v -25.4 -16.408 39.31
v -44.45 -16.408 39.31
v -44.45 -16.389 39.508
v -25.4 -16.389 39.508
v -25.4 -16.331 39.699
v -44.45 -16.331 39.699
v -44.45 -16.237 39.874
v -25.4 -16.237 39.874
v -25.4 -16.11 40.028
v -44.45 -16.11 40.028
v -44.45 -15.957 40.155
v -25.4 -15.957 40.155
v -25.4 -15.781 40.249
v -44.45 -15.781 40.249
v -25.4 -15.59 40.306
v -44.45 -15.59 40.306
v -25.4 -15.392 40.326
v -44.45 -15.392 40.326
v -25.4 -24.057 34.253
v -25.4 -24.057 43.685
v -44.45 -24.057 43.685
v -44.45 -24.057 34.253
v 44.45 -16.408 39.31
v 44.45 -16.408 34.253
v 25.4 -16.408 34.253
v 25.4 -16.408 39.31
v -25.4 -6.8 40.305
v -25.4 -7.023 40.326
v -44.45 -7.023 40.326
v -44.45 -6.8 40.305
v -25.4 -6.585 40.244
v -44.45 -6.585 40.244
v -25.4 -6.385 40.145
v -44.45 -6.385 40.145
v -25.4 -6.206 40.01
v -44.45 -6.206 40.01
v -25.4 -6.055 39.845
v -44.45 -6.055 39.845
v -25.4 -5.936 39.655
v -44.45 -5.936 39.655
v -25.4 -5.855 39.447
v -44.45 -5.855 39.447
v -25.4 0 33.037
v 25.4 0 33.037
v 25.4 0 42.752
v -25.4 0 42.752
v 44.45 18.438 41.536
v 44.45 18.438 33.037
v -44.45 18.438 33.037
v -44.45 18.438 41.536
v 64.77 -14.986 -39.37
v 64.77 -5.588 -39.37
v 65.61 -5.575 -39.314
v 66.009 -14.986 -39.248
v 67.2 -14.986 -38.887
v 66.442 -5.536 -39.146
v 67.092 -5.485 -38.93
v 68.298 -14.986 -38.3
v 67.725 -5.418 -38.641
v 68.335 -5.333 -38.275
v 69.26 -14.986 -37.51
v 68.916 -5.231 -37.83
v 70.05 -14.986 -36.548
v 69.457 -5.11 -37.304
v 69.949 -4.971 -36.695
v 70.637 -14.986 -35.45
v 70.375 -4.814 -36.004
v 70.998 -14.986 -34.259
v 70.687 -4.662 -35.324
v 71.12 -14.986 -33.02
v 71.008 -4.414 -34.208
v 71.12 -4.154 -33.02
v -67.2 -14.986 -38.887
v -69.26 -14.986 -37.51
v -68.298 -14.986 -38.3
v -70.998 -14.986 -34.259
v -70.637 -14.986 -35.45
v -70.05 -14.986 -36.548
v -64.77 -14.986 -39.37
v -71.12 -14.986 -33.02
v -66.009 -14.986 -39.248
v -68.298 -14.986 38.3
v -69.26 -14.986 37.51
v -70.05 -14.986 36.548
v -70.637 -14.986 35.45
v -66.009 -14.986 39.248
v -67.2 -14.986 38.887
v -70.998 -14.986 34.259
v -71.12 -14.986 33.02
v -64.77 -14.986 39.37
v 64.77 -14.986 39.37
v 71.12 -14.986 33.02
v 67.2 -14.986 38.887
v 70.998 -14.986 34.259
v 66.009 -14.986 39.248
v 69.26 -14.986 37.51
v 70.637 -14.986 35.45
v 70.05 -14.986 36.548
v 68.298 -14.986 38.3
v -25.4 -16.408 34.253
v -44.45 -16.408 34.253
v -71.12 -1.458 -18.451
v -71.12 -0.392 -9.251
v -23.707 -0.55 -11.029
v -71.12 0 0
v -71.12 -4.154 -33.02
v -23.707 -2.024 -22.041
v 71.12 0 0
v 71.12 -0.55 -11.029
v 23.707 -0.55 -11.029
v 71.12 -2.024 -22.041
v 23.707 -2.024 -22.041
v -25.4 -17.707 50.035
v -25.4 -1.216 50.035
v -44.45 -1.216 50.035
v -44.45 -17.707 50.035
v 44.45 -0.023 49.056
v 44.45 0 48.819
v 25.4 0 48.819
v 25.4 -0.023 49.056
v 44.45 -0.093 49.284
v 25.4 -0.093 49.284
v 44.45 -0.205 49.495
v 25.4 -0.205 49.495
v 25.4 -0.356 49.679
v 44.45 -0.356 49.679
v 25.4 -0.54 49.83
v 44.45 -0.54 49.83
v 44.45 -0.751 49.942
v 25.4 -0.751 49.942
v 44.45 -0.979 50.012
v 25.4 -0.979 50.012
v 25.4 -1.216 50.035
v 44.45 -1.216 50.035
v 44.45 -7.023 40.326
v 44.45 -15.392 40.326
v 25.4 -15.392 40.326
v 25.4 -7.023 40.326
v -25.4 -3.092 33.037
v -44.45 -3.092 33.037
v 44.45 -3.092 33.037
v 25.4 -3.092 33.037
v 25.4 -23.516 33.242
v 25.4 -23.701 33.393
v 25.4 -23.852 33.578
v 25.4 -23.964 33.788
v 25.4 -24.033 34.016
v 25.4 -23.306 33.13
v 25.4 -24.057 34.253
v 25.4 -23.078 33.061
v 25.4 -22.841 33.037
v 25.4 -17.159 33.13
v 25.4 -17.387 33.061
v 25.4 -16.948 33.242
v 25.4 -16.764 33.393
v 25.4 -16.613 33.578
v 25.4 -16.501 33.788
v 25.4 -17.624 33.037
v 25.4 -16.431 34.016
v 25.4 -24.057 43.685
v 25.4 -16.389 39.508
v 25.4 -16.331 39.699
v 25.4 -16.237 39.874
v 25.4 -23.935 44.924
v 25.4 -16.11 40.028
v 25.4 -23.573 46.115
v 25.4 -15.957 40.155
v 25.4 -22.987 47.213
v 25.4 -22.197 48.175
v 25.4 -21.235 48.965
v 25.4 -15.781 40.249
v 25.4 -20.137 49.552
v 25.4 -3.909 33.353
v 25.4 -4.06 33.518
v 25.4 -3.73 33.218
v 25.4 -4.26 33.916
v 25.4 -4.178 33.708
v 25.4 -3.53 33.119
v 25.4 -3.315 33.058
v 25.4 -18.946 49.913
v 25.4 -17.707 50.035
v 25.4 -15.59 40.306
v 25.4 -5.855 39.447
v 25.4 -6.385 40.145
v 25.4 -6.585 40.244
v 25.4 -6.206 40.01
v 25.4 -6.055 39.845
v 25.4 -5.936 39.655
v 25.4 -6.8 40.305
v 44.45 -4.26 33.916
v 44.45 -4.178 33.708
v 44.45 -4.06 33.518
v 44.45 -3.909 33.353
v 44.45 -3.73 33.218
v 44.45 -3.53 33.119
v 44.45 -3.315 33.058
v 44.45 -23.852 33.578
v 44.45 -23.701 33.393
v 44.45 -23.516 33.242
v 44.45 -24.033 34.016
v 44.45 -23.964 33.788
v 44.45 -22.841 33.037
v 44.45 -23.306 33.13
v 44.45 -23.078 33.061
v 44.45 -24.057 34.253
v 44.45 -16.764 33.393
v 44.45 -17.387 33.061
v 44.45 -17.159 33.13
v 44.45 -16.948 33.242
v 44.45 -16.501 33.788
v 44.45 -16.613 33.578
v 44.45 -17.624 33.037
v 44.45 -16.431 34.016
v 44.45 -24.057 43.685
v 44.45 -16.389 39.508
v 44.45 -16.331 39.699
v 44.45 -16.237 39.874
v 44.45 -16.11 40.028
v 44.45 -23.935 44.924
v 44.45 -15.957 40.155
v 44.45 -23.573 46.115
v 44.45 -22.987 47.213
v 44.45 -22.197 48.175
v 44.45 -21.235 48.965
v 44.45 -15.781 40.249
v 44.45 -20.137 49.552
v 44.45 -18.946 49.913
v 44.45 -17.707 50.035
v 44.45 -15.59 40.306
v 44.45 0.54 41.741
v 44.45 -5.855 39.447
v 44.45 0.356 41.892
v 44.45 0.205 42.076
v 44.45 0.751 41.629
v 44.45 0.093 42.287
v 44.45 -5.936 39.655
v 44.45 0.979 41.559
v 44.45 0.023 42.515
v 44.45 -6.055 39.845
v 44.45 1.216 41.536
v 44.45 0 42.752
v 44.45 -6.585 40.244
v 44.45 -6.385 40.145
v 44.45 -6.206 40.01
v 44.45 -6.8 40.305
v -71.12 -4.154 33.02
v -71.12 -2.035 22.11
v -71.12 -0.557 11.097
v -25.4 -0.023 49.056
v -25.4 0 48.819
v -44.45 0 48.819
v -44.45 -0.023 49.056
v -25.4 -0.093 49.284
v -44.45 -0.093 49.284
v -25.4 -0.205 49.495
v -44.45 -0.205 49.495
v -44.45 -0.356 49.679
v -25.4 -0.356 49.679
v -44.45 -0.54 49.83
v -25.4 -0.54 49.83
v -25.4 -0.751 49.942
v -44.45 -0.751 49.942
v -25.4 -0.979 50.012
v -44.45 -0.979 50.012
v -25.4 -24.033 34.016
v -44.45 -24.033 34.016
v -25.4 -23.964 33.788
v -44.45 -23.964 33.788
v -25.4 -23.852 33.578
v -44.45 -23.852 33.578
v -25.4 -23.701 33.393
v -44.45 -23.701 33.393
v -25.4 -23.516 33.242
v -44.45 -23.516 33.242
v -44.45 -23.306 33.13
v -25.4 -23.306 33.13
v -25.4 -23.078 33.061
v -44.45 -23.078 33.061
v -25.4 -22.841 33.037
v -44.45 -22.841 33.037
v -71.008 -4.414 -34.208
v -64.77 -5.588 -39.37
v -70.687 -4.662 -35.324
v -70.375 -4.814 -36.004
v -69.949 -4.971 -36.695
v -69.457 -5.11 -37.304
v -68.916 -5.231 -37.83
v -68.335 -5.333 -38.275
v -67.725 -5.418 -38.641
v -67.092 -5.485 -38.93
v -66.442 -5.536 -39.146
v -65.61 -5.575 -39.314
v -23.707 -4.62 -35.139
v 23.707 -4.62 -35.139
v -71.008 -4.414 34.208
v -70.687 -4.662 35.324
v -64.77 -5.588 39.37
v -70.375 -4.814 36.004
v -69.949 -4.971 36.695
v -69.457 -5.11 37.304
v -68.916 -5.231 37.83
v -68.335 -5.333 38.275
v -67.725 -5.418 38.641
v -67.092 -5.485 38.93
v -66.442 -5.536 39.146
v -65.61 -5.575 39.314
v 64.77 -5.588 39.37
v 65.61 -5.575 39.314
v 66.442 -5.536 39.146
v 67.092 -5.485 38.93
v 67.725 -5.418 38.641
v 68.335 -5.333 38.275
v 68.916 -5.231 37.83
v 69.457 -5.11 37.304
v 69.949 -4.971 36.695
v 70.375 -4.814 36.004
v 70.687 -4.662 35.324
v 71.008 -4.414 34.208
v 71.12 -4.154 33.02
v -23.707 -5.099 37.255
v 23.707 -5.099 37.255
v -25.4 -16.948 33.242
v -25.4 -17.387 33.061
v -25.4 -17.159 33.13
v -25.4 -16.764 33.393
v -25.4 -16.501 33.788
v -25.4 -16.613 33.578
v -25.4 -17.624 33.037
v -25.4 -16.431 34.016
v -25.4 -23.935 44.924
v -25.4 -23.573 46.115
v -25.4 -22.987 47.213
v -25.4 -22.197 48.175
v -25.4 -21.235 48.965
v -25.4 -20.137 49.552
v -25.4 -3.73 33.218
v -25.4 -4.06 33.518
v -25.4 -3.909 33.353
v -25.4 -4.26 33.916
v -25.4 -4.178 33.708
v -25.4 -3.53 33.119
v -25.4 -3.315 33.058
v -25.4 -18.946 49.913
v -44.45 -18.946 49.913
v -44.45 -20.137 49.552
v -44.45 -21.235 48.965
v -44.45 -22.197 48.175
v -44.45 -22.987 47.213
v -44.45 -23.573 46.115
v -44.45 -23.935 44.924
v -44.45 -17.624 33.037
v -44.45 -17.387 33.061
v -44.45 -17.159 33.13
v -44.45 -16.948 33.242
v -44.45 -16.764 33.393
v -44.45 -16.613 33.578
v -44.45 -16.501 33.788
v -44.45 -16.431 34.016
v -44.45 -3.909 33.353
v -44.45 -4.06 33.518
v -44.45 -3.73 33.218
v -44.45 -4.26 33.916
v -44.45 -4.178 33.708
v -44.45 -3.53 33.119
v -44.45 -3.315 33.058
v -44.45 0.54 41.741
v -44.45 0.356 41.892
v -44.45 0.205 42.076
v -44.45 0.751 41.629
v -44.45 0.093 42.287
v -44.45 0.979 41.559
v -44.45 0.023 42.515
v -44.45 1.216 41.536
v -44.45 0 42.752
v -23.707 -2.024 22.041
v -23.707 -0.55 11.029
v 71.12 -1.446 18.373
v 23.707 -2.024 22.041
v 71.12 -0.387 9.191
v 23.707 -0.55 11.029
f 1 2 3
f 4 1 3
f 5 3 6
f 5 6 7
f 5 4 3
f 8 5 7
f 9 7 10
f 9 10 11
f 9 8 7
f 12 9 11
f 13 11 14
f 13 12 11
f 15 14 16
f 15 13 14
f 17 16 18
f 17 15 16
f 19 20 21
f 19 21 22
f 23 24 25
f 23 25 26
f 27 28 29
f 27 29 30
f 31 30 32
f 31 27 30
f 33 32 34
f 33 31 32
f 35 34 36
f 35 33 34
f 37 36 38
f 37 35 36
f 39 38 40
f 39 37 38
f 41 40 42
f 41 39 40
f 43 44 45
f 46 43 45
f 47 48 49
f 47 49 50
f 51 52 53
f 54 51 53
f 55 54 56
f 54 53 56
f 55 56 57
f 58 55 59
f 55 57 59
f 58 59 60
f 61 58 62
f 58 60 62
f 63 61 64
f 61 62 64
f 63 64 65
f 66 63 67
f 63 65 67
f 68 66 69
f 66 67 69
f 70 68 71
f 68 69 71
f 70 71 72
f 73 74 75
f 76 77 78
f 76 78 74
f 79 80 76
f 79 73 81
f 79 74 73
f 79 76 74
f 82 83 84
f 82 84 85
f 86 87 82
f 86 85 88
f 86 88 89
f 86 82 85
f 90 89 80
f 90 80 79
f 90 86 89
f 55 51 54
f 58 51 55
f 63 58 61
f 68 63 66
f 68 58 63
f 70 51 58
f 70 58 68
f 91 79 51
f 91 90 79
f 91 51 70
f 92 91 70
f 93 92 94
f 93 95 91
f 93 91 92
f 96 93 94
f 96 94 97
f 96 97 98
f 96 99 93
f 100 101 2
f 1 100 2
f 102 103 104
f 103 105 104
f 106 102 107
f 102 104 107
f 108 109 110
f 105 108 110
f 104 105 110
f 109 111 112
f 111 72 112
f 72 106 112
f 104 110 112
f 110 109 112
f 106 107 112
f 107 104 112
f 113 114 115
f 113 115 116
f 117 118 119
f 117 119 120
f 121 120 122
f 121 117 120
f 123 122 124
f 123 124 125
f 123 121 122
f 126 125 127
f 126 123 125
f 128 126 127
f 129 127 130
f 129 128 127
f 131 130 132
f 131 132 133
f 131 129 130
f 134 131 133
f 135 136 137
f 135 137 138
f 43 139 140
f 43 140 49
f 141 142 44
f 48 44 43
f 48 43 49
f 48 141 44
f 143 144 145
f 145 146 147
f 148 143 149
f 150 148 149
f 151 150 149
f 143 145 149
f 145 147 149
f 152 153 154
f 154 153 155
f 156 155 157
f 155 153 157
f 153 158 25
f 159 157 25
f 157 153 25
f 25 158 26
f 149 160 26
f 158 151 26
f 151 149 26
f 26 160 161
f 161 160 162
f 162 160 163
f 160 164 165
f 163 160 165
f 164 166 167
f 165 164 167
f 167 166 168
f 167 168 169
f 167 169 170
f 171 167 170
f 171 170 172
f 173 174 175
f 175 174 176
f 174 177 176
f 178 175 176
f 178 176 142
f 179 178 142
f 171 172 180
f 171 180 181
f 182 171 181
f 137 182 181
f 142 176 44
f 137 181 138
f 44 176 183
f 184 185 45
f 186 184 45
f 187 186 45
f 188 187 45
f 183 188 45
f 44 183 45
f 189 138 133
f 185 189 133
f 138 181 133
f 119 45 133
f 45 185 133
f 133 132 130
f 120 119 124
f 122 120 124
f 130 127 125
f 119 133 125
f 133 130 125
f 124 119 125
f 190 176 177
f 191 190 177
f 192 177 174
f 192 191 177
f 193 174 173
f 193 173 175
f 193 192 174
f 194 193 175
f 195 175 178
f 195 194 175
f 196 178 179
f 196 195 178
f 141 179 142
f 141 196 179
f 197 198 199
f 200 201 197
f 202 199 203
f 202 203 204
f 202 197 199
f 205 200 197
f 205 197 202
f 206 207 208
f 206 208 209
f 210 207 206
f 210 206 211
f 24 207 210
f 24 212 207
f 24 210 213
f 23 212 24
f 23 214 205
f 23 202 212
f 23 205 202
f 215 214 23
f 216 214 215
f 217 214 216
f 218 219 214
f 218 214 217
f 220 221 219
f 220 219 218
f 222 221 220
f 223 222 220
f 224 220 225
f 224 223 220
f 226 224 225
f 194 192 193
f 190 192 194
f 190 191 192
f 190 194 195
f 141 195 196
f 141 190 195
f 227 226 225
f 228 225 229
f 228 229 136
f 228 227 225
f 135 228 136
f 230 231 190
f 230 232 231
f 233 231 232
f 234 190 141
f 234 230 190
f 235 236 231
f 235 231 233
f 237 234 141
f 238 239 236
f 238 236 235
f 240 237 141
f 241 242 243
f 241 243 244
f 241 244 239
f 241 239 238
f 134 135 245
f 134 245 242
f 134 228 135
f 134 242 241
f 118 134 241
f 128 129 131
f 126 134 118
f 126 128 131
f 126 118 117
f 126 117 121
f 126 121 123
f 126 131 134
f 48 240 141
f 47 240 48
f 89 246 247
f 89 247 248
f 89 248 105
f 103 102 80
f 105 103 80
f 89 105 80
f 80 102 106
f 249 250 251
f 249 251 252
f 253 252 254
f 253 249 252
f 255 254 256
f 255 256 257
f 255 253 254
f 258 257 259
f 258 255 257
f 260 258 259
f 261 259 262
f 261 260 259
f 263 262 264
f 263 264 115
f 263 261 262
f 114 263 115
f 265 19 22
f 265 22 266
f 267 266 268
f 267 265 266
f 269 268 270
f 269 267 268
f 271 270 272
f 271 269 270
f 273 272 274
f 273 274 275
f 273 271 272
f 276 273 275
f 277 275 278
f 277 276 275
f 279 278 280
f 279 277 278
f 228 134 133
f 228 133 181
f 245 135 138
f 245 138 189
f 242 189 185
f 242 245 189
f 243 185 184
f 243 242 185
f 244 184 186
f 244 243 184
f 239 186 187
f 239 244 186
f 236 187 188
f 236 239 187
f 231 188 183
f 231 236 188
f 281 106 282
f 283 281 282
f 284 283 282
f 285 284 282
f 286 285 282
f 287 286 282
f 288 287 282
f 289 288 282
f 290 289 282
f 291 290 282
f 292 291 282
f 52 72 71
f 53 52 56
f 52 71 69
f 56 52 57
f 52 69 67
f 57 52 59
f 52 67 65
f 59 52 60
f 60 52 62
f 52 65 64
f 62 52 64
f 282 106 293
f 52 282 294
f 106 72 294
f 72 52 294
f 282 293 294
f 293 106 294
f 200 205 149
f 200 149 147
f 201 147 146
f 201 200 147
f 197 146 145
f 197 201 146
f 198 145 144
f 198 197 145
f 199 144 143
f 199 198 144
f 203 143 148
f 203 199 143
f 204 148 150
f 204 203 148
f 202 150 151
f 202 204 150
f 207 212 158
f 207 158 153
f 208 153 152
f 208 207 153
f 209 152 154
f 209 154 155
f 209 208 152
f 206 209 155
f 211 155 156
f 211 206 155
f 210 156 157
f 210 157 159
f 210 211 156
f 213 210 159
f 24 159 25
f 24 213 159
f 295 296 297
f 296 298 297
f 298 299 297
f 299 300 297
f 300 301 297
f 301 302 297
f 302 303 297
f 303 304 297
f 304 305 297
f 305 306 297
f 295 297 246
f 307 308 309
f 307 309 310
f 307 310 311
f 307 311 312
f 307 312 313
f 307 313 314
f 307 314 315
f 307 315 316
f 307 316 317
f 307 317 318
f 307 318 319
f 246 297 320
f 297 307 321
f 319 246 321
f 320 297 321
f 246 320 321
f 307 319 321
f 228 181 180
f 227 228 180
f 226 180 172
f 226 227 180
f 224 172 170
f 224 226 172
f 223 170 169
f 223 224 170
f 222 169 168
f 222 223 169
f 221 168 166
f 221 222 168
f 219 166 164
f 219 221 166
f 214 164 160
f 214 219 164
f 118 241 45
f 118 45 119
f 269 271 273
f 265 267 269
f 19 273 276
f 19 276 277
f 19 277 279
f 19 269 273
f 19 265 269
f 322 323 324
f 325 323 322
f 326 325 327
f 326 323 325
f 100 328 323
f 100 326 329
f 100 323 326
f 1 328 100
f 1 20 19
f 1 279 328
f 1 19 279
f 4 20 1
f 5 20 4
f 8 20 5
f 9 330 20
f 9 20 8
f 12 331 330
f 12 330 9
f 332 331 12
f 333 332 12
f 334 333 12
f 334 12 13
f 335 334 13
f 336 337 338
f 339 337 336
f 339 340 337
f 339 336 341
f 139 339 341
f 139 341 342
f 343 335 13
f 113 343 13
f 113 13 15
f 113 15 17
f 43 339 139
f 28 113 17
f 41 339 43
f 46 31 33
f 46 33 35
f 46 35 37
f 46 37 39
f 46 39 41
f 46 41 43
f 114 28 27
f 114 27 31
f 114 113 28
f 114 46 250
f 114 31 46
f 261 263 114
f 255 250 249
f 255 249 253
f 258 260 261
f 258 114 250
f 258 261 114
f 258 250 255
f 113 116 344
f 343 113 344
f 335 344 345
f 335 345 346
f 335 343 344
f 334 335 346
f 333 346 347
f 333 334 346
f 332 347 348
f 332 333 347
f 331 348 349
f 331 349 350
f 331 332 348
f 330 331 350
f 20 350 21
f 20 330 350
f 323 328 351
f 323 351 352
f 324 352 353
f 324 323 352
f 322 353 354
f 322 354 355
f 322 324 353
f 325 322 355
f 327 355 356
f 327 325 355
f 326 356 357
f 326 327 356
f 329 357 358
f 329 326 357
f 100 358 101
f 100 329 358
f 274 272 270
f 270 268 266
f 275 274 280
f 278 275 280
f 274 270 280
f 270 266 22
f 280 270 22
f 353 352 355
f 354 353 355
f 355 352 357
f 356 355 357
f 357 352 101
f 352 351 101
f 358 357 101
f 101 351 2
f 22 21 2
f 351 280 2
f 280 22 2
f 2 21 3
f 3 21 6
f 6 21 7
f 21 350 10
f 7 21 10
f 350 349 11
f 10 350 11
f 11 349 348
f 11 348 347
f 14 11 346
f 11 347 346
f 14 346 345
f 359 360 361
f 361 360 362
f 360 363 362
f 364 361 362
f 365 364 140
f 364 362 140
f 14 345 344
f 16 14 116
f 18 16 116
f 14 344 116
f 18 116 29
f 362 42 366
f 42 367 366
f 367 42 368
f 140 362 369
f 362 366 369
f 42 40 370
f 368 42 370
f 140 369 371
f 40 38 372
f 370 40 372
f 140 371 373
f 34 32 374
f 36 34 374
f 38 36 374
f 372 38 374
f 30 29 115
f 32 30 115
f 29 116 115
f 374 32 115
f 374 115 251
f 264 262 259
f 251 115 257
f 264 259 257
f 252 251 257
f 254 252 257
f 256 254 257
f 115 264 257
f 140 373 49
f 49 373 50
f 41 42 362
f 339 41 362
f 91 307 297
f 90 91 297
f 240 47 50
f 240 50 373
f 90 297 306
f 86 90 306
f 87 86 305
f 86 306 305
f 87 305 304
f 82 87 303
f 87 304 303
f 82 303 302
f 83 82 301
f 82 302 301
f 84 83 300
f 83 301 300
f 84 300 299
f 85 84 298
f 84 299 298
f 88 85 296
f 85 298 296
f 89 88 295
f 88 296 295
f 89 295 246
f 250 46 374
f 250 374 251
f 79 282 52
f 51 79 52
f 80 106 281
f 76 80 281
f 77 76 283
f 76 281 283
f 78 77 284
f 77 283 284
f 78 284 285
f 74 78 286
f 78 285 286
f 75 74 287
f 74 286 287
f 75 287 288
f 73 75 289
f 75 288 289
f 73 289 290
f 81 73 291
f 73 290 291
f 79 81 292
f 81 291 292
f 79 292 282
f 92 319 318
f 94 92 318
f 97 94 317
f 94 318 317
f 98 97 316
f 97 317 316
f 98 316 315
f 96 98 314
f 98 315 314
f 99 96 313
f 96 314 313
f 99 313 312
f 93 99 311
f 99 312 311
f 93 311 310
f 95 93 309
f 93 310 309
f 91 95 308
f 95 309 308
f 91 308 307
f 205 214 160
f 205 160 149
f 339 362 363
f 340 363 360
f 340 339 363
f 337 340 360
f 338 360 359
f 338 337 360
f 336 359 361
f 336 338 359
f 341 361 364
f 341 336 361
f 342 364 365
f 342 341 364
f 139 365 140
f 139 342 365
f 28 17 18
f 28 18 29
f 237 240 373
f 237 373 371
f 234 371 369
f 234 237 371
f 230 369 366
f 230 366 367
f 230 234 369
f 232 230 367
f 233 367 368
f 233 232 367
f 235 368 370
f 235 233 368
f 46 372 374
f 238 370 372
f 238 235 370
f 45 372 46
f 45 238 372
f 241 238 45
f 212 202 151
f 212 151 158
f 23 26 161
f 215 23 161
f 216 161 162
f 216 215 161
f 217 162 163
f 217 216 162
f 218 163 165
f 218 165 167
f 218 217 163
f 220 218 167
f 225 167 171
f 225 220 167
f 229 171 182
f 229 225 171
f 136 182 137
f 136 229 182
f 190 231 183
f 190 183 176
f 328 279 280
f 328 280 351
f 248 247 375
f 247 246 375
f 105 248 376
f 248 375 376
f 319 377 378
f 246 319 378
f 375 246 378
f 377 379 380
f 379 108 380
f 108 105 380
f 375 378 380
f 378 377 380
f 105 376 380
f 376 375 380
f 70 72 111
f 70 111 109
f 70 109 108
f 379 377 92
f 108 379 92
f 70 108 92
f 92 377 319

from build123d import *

# Parameters (mm, degrees)
F1_DEPTH      = 14.986
F3_DEPTH      = 142.241
F5_DEPTH      = 44.45
F5_DEPTH_BACK = 44.45
F6_DEPTH      = 25.4
F6_DEPTH_BACK = 25.4


# Not quite as in the source:
# - a feature names something its author has since deleted; it is built from what else it names


with BuildPart() as f1:
    # F0 (on Front) → F1 (new body)
    with BuildSketch(Plane.XZ):
        with BuildLine():
            Line((-64.77, -39.37), (64.77, -39.37))
            ThreePointArc((64.77, -39.37), (69.2601280605, -37.5101280605), (71.12, -33.02))
            Line((71.12, -33.02), (71.12, 33.02))
            ThreePointArc((71.12, 33.02), (69.2601280605, 37.5101280605), (64.77, 39.37))
            Line((64.77, 39.37), (-64.77, 39.37))
            ThreePointArc((-64.77, 39.37), (-69.2601280605, 37.5101280605), (-71.12, 33.02))
            Line((-71.12, 33.02), (-71.12, -33.02))
            ThreePointArc((-71.12, -33.02), (-69.2601280605, -37.5101280605), (-64.77, -39.37))
        make_face()
    extrude(amount=F1_DEPTH)

    # F2 (on face) → F3 (cut, through all)
    with BuildSketch(Plane.YZ.offset(71.12)):
        with BuildLine():
            Line((0, 39.37), (-5.588, 39.37))
            add(Edge.make_bspline(
                [(-5.588, 39.37), (-5.0939327167, 37.2564899548), (-4.6132131193, 35.139642988), (-4.1544956107, 33.02)],
                knots=[0, 0, 0, 0, 0.0810477827, 0.0810477827, 0.0810477827, 0.0810477827], degree=3))
            Line((-4.1544956107, 33.02), (0, 33.02))
            Line((0, 33.02), (0, 39.37))
        make_face()
        with BuildLine():
            Line((0, 33.02), (-4.1544956107, 33.02))
            add(Edge.make_bspline(
                [(-4.1544956107, 33.02), (-1.7832929575, 22.0631409692), (0, 11.0315704846), (0, 0)],
                knots=[0.0810477827, 0.0810477827, 0.0810477827, 0.0810477827, 0.5, 0.5, 0.5, 0.5], degree=3))
            Line((0, 0), (0, 33.02))
        make_face()
        with BuildLine():
            Line((0, -33.02), (0, 0))
            add(Edge.make_bspline(
                [(0, 0), (0, -11.0315704846), (-1.7832929575, -22.0631409692), (-4.1544956107, -33.02)],
                knots=[0.5, 0.5, 0.5, 0.5, 0.9189522173, 0.9189522173, 0.9189522173, 0.9189522173], degree=3))
            Line((-4.1544956107, -33.02), (0, -33.02))
        make_face()
        with BuildLine():
            Line((0, -33.02), (-4.1544956107, -33.02))
            add(Edge.make_bspline(
                [(-4.1544956107, -33.02), (-4.6132131193, -35.139642988), (-5.0939327167, -37.2564899548), (-5.588, -39.37)],
                knots=[0.9189522173, 0.9189522173, 0.9189522173, 0.9189522173, 1, 1, 1, 1], degree=3))
            Line((-5.588, -39.37), (0, -39.37))
            Line((0, -39.37), (0, -39.1186140473))
            Line((0, -39.1186140473), (0, -33.02))
        make_face()
    extrude(amount=-F3_DEPTH, mode=Mode.SUBTRACT)


with BuildPart() as f5:
    # F4 (on Right) → F5 (new body, two sides)
    with BuildSketch(Plane.YZ) as f5_sk:
        with BuildLine():
            Line((-1.2158148456, 50.0348769128), (-17.7066842258, 50.0348769128))
            ThreePointArc((-17.7066842258, 50.0348769128), (-22.1968122863, 48.1750049734), (-24.0566842258, 43.6848769128))
            Line((-24.0566842258, 43.6848769128), (-24.0566842258, 34.2530116905))
            ThreePointArc((-24.0566842258, 34.2530116905), (-23.7005803022, 33.3933007684), (-22.8408693802, 33.0371968448))
            Line((-22.8408693802, 33.0371968448), (-17.6238791954, 33.0371968448))
            ThreePointArc((-17.6238791954, 33.0371968448), (-16.7641682733, 33.3933007684), (-16.4080643497, 34.2530116905))
            Line((-16.4080643497, 34.2530116905), (-16.4080643497, 39.3098837759))
            ThreePointArc((-16.4080643497, 39.3098837759), (-16.1104848394, 40.0283042656), (-15.3920643497, 40.3258837759))
            Line((-15.3920643497, 40.3258837759), (-7.023171001, 40.3258837759))
            ThreePointArc((-7.023171001, 40.3258837759), (-6.2922111741, 40.0816158774), (-5.8549638669, 39.4469633211))
            Line((-5.8549638669, 39.4469633211), (-4.2599462141, 33.9161172996))
            ThreePointArc((-4.2599462141, 33.9161172996), (-3.8226989069, 33.2814647434), (-3.09173908, 33.0371968448))
            Line((-3.09173908, 33.0371968448), (0, 33.0371968448))
            Line((0, 33.0371968448), (0, 41.5360368788))
            Line((0, 41.5360368788), (0, 42.7518517245))
            Line((0, 42.7518517245), (0, 44.9006222188))
            Line((0, 44.9006222188), (0, 48.8190620672))
            ThreePointArc((0, 48.8190620672), (-0.3561039236, 49.6787729892), (-1.2158148456, 50.0348769128))
        make_face()
        with BuildLine():
            ThreePointArc((1.2158148456, 41.5360368788), (0.3561039236, 41.8921408024), (0, 42.7518517245))
            Line((0, 42.7518517245), (0, 41.5360368788))
            Line((0, 41.5360368788), (1.2158148456, 41.5360368788))
        make_face()
        Polygon((18.4375178069, 41.5360368788), (1.2158148456, 41.5360368788), (0, 41.5360368788), (0, 33.0371968448), (18.4375178069, 33.0371968448), align=None)
    extrude(amount=F5_DEPTH)
    extrude(f5_sk.sketch, amount=-F5_DEPTH_BACK)

    # F4 (on Right) → F6 (cut, two sides)
    with BuildSketch(Plane.YZ) as f6_sk:
        with BuildLine():
            Line((-1.2158148456, 50.0348769128), (-17.7066842258, 50.0348769128))
            ThreePointArc((-17.7066842258, 50.0348769128), (-22.1968122863, 48.1750049734), (-24.0566842258, 43.6848769128))
            Line((-24.0566842258, 43.6848769128), (-24.0566842258, 34.2530116905))
            ThreePointArc((-24.0566842258, 34.2530116905), (-23.7005803022, 33.3933007684), (-22.8408693802, 33.0371968448))
            Line((-22.8408693802, 33.0371968448), (-17.6238791954, 33.0371968448))
            ThreePointArc((-17.6238791954, 33.0371968448), (-16.7641682733, 33.3933007684), (-16.4080643497, 34.2530116905))
            Line((-16.4080643497, 34.2530116905), (-16.4080643497, 39.3098837759))
            ThreePointArc((-16.4080643497, 39.3098837759), (-16.1104848394, 40.0283042656), (-15.3920643497, 40.3258837759))
            Line((-15.3920643497, 40.3258837759), (-7.023171001, 40.3258837759))
            ThreePointArc((-7.023171001, 40.3258837759), (-6.2922111741, 40.0816158774), (-5.8549638669, 39.4469633211))
            Line((-5.8549638669, 39.4469633211), (-4.2599462141, 33.9161172996))
            ThreePointArc((-4.2599462141, 33.9161172996), (-3.8226989069, 33.2814647434), (-3.09173908, 33.0371968448))
            Line((-3.09173908, 33.0371968448), (0, 33.0371968448))
            Line((0, 33.0371968448), (0, 41.5360368788))
            Line((0, 41.5360368788), (0, 42.7518517245))
            Line((0, 42.7518517245), (0, 44.9006222188))
            Line((0, 44.9006222188), (0, 48.8190620672))
            ThreePointArc((0, 48.8190620672), (-0.3561039236, 49.6787729892), (-1.2158148456, 50.0348769128))
        make_face()
    extrude(amount=-F6_DEPTH, mode=Mode.SUBTRACT)
    extrude(f6_sk.sketch, amount=F6_DEPTH_BACK, mode=Mode.SUBTRACT)


solid = Compound([f1.part, f5.part])
